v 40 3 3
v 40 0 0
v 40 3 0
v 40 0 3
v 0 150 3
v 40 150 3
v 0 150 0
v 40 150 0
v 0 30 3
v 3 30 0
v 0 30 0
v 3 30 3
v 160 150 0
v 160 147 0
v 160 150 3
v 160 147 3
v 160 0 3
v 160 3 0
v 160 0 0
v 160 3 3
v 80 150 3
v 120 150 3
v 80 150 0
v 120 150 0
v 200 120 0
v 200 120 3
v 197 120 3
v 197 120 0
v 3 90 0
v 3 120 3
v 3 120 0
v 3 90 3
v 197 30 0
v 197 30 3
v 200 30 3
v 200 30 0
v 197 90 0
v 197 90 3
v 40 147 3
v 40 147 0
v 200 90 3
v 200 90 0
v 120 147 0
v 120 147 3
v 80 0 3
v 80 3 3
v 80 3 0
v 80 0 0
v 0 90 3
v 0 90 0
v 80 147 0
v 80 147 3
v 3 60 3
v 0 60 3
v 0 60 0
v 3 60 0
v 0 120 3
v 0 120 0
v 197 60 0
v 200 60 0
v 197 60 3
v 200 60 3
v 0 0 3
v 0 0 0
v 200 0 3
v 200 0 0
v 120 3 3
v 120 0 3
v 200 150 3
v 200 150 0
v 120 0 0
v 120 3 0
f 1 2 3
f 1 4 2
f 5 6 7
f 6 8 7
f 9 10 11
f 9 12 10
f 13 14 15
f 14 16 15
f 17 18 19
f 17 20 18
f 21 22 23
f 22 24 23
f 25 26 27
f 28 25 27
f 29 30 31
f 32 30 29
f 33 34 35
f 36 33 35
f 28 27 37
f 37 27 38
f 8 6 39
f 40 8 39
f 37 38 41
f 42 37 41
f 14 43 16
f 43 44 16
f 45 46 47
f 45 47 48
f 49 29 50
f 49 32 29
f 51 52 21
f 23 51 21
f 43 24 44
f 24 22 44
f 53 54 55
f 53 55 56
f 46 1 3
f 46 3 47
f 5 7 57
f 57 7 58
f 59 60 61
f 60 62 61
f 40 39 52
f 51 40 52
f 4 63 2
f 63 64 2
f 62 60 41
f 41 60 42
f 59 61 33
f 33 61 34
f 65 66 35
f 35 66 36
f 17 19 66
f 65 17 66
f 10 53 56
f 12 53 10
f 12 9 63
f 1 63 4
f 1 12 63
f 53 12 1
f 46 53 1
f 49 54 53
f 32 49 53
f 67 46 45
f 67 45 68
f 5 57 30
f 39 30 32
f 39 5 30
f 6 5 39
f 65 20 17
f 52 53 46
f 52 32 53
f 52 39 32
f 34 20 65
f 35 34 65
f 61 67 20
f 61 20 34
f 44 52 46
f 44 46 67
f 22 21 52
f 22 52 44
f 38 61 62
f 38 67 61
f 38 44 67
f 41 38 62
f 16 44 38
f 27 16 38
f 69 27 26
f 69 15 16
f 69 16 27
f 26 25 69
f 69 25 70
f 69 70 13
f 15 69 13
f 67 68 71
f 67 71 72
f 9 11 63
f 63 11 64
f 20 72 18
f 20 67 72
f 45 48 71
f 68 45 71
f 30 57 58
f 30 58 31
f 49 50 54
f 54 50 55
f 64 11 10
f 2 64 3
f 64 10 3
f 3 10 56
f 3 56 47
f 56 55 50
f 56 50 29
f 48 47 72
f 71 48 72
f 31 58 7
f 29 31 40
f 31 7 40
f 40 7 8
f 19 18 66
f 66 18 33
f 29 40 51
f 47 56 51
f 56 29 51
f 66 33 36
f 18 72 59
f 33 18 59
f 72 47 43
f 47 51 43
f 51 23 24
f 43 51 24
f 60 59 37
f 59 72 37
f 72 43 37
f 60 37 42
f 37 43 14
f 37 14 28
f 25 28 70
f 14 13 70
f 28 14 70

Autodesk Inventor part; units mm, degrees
ref_plane "YZ Plane" through (0, 0, 0) normal (1, 0, 0) x (0, 1, 0)
ref_plane "XZ Plane" through (0, 0, 0) normal (0, 1, 0) x (-1, 0, 0)
ref_plane "XY Plane" through (0, 0, 0) normal (0, 0, 1) x (1, 0, 0)
sketch "Sketch1" plane through (0, 0, 0) normal (0, 0, 1) x (1, 0, 0)
  line L0 (0, 0) -> (200, 0)
  line L1 (200, 0) -> (200, 150)
  line L2 (200, 150) -> (0, 150)
  line L3 (0, 150) -> (0, 0)
  dimension "d0" = 200
  dimension "d1" = 150
extrude "Extrusion1" add sketch "Sketch1" along normal blind 3
sketch "Sketch2" plane through (0, 0, 3) normal (0, 0, 1) x (1, 0, 0)
  line L0 (0, 0) -> (40, 0)
  line L1 (0, 0) -> (200, 0) projected
  line L2 (40, 0) -> (40, 3)
  line L3 (40, 3) -> (80, 3)
  line L4 (80, 3) -> (80, 0)
  line L5 (80, 0) -> (120, 0)
  line L6 (0, 150) -> (0, 0) projected
  line L7 (0, 75) -> (200, 75)
  line L8 (200, 0) -> (200, 150) projected
  line L9 (120, 0) -> (120, 3)
  line L10 (120, 3) -> (160, 3)
  line L11 (160, 3) -> (160, 0)
  line L12 (40, 0) -> (80, 0)
  line L13 (120, 0) -> (160, 0)
  line L14 (200, 150) -> (0, 150) projected
  line L15 (0, 150) -> (0, 120)
  line L16 (0, 120) -> (3, 120)
  line L17 (3, 120) -> (3, 90)
  line L18 (3, 90) -> (0, 90)
  line L19 (0, 90) -> (0, 60)
  line L20 (0, 60) -> (3, 60)
  line L21 (3, 60) -> (3, 30)
  line L22 (3, 30) -> (0, 30)
  line L23 (0, 30) -> (0, 0)
  line L24 (100, 150) -> (100, 0)
  line L25 (0, 60) -> (0, 30)
  line L26 (0, 120) -> (0, 90)
  line L27 (200, 120) -> (197, 120)
  line L28 (197, 120) -> (197, 90)
  line L29 (197, 90) -> (200, 90)
  line L30 (200, 90) -> (200, 60)
  line L31 (200, 60) -> (197, 60)
  line L32 (197, 60) -> (197, 30)
  line L33 (197, 30) -> (200, 30)
  line L34 (200, 60) -> (200, 30)
  line L35 (200, 120) -> (200, 90)
  line L36 (40, 150) -> (40, 147)
  line L37 (40, 147) -> (80, 147)
  line L38 (80, 147) -> (80, 150)
  line L39 (80, 150) -> (120, 150)
  line L40 (120, 150) -> (120, 147)
  line L41 (120, 147) -> (160, 147)
  line L42 (160, 147) -> (160, 150)
  line L43 (40, 150) -> (80, 150)
  line L44 (120, 150) -> (160, 150)
  dimension "d4" = 40
  dimension "d6" = 3
  dimension "d7" = 40
  dimension "d8" = 40
  dimension "d19" = 40
  dimension "d20" = 30
  dimension "d21" = 3
  dimension "d22" = 30
  dimension "d23" = 30
  dimension "d24" = 30
extrude "Extrusion2" cut sketch "Sketch2" against normal blind 3 contours L2 L3 L4 L1 | L6 L20 L21 L22 | L9 L10 L11 L1 | L6 L16 L17 L18 | L8 L33 L32 L31 | L29 L28 L27 L8 | L14 L42 L41 L40 | L38 L37 L36 L14
properties part number "TAPA"
